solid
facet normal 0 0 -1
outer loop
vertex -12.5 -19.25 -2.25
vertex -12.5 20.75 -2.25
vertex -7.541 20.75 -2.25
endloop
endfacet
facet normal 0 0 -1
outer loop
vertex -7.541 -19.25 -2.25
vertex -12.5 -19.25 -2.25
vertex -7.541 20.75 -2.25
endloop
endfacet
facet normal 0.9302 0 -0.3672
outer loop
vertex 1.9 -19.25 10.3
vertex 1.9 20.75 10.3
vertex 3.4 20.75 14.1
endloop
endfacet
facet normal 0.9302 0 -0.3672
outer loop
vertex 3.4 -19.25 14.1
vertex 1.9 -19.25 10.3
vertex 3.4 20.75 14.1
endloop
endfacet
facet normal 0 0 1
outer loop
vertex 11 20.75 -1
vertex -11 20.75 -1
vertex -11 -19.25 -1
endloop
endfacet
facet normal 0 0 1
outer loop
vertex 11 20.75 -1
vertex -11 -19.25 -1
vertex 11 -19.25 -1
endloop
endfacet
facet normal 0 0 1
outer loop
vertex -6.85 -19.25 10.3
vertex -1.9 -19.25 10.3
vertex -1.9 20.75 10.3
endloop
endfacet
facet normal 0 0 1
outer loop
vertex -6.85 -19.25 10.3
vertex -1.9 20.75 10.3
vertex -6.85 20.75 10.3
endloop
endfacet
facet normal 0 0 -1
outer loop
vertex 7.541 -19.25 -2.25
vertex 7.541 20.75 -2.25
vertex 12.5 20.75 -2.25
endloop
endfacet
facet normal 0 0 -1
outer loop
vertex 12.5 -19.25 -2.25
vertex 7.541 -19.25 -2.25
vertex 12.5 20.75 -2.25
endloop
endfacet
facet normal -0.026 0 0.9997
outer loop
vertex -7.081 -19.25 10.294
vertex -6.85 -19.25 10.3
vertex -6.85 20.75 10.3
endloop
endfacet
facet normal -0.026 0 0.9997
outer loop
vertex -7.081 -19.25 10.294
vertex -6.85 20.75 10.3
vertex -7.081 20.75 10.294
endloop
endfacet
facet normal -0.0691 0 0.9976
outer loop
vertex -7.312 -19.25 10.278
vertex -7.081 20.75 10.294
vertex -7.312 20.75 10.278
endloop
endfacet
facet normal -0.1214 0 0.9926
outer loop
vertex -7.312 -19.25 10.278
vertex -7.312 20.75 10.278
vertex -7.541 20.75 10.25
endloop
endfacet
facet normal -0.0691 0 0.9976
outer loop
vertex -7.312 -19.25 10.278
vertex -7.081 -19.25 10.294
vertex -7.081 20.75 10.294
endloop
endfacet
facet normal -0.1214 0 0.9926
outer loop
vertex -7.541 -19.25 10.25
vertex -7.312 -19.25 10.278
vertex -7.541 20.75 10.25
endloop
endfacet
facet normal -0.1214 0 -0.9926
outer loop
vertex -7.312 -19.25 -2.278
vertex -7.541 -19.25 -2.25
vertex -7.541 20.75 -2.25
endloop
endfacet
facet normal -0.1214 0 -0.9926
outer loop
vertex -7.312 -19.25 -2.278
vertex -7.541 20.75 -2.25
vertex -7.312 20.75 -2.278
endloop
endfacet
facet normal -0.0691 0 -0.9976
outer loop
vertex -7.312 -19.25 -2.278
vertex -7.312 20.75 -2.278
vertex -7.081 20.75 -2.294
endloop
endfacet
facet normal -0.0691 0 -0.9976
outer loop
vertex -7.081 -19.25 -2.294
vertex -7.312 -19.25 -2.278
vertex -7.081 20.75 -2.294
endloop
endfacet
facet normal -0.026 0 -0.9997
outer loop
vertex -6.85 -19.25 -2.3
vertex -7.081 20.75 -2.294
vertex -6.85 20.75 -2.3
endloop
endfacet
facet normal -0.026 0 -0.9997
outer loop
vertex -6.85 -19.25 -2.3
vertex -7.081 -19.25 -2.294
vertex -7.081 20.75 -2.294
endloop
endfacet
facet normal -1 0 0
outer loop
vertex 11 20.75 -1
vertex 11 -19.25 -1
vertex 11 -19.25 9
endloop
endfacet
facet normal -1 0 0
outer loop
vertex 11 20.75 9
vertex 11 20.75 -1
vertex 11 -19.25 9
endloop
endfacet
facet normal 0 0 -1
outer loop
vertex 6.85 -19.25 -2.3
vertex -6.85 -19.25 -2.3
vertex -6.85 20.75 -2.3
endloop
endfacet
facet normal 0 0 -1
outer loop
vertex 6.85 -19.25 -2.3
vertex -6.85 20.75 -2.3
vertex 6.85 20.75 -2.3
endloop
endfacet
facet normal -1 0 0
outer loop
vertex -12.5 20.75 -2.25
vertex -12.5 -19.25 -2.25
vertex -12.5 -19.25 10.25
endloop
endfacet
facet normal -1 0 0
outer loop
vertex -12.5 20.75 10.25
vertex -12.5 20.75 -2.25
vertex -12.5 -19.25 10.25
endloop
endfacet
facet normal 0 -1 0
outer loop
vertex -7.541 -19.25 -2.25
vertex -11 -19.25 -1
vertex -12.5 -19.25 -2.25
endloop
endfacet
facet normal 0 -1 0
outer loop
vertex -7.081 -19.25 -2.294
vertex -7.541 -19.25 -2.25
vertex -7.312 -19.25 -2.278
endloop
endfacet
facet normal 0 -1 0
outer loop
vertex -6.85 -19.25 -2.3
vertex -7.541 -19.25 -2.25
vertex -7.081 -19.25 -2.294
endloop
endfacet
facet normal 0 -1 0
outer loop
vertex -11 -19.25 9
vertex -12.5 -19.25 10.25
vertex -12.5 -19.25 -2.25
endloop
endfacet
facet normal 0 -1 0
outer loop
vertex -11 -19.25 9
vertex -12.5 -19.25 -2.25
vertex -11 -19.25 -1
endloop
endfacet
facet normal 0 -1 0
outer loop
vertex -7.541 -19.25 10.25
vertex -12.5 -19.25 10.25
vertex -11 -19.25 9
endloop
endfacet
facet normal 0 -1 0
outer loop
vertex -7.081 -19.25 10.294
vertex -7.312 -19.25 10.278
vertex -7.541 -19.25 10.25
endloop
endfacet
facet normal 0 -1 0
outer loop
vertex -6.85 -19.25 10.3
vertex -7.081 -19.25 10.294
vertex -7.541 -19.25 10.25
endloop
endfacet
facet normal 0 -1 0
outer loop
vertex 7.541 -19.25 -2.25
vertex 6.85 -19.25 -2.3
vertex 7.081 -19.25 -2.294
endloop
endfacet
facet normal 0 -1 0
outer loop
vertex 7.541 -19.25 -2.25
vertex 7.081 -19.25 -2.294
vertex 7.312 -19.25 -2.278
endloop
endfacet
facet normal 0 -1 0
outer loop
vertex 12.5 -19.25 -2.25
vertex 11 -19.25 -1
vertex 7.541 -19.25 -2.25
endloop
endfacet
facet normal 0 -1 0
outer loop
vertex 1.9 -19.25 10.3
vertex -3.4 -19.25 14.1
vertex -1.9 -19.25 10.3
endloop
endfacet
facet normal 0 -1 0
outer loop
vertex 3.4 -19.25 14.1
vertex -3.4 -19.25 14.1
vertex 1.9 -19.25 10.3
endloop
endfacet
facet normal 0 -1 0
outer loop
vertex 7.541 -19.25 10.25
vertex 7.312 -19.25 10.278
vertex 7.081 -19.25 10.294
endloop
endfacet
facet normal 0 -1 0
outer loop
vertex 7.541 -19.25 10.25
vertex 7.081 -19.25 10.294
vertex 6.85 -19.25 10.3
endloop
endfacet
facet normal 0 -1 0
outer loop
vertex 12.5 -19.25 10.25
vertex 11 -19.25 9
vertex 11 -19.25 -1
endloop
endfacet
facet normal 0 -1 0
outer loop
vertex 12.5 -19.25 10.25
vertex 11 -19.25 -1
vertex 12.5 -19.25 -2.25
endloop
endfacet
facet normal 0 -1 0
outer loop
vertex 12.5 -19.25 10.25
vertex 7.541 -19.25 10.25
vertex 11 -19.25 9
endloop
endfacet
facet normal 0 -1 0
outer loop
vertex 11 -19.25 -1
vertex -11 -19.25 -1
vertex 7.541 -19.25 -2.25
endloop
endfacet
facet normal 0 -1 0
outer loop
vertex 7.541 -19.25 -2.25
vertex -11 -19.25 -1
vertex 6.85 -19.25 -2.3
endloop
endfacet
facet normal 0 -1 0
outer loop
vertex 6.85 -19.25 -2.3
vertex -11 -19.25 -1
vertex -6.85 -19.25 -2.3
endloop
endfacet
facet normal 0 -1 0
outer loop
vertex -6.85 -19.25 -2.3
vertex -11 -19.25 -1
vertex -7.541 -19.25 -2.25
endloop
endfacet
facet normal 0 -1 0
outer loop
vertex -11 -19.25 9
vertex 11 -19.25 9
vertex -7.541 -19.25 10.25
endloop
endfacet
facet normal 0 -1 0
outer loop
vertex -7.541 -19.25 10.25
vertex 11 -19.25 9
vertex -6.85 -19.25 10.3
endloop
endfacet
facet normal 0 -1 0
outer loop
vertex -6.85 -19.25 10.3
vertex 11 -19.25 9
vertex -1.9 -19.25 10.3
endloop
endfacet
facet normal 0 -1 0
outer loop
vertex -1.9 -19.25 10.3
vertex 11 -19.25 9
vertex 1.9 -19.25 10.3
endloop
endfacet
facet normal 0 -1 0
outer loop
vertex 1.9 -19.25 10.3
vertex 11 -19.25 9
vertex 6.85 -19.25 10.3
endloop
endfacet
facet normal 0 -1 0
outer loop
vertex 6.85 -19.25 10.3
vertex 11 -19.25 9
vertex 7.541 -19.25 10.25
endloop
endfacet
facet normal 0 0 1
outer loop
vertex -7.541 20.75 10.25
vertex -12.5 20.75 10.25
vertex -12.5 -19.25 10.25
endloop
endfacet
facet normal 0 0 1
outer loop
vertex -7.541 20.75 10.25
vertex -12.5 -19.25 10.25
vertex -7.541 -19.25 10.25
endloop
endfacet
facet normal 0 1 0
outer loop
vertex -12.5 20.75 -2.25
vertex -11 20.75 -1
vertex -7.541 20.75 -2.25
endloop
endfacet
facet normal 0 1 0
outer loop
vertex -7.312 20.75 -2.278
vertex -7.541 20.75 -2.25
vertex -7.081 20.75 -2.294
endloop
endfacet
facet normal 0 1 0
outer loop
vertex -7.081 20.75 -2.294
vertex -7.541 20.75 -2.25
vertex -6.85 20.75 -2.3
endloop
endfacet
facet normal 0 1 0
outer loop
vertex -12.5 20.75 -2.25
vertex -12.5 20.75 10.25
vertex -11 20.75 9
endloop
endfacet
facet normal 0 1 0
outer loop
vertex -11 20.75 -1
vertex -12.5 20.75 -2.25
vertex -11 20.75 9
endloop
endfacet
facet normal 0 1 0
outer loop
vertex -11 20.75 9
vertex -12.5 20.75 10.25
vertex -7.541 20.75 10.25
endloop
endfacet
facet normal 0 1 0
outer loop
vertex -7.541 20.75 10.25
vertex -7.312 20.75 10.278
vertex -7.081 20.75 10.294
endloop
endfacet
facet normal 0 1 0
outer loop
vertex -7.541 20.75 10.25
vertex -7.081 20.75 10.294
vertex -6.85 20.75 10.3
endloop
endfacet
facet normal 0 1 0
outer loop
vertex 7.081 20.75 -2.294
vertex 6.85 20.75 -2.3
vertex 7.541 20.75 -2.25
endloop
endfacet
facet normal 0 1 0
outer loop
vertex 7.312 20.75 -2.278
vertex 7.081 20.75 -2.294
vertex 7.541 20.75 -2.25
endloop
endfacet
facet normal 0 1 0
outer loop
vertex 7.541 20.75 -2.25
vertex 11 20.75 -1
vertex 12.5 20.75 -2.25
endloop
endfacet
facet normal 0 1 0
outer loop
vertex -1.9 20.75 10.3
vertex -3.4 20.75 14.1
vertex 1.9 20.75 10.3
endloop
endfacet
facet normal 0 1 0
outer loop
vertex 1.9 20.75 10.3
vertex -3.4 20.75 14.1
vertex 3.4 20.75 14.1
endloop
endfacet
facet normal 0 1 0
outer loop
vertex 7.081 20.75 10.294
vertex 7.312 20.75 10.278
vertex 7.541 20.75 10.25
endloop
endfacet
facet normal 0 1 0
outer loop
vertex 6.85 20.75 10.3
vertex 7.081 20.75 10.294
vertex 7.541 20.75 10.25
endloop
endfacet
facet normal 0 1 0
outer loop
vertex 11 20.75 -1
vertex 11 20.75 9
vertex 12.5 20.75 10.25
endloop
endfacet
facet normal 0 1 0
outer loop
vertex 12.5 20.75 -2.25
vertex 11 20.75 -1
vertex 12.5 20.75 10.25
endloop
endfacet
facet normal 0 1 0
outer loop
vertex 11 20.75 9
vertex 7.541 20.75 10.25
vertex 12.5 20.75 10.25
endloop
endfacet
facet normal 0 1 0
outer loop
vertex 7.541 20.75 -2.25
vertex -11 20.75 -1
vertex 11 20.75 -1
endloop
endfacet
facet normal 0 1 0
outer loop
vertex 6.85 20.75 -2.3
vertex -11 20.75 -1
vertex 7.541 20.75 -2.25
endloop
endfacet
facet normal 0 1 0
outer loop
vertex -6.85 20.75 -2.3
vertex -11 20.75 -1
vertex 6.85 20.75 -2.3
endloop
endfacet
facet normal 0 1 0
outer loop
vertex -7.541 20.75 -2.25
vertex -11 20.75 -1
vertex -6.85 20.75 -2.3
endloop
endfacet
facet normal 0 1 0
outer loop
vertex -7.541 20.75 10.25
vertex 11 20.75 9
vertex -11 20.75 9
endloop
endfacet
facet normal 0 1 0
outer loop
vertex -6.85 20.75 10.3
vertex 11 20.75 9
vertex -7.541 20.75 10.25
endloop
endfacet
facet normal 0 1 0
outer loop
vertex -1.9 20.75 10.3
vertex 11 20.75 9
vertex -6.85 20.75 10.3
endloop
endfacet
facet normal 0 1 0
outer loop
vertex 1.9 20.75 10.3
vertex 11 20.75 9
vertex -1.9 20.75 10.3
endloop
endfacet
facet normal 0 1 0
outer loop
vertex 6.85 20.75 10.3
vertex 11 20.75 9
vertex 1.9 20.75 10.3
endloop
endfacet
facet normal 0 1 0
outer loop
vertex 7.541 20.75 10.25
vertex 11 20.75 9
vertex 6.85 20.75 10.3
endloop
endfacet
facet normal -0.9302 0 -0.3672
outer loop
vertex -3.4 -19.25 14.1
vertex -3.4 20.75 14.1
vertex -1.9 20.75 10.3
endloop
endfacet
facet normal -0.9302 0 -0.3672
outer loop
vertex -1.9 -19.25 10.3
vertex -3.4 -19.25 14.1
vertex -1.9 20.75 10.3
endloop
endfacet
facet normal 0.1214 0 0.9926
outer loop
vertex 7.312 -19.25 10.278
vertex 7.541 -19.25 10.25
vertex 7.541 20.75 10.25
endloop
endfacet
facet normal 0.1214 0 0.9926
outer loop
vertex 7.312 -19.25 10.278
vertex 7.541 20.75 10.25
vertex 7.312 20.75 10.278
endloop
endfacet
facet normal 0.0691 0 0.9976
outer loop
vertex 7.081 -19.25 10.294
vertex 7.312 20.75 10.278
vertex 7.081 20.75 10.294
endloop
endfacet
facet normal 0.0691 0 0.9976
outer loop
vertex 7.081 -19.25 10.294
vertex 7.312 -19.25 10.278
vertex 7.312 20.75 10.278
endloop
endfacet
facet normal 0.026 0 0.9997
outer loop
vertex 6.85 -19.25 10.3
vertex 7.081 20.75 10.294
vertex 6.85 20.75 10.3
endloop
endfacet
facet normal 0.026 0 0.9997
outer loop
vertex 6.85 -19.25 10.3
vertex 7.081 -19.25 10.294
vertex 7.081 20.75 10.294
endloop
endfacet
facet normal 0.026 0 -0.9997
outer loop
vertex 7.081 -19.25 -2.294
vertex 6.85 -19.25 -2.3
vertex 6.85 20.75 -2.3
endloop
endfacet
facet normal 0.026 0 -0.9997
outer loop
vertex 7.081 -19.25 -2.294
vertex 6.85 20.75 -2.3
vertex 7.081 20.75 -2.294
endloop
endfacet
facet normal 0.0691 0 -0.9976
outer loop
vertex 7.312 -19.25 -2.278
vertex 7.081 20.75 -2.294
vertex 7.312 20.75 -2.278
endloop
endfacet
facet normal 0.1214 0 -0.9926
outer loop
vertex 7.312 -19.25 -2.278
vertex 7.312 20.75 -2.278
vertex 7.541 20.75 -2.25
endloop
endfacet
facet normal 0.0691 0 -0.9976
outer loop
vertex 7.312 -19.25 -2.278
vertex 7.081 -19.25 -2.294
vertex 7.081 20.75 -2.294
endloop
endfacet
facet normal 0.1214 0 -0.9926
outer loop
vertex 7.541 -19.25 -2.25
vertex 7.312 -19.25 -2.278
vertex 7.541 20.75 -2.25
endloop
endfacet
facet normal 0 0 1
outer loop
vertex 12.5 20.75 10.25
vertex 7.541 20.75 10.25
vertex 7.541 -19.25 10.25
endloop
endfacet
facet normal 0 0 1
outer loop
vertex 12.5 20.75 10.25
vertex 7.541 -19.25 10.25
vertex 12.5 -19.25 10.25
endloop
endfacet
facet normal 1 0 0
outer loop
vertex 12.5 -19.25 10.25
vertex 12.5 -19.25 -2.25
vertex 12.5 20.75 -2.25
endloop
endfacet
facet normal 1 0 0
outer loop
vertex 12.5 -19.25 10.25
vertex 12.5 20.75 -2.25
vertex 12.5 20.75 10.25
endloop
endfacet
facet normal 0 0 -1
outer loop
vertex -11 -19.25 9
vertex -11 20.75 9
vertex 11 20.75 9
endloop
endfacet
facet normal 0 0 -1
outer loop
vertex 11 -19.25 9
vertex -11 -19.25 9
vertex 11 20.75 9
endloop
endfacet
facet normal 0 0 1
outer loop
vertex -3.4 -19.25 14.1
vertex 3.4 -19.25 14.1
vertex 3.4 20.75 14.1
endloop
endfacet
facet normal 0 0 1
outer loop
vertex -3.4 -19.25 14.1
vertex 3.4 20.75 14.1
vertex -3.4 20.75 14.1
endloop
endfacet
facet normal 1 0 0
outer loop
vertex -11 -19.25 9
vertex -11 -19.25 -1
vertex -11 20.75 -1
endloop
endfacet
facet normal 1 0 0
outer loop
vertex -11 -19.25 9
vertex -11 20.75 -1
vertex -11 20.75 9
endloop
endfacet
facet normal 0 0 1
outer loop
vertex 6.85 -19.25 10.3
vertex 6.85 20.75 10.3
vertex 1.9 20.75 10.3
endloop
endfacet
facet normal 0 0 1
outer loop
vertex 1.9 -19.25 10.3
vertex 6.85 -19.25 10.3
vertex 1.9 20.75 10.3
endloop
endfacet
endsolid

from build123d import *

# Parameters (mm, degrees)
F0_W      = 18.7
F0_H      = 38.5
F1_DEPTH  = 8
F2_R      = 2.5
F4_DEPTH  = 40
F7_DEPTH  = 40
F8_W      = 25
F8_H      = 12.5
F9_DEPTH  = 40
F10_W     = 22
F10_H     = 10
F11_DEPTH = 40


with BuildPart() as f1:
    # F0 (on Top) → F1 (new body)
    with BuildSketch(Plane.XY):
        Rectangle(F0_W, F0_H)
    extrude(amount=F1_DEPTH)

    # F2
    f2_edges = [f1.edges().sort_by_distance(p)[0] for p in [
        (9.35, 0, 8),
        (9.35, 0, 0),
        (-9.35, 0, 8),
        (-9.35, 0, 0),
    ]]
    fillet(f2_edges, radius=F2_R)


with BuildPart() as f4:
    # F3 (on face) → F4 (new body)
    with BuildSketch(Plane.XZ.offset(19.25)):
        with BuildLine():
            Line((-11.65, 5.5), (-11.65, 2.5))
            ThreePointArc((-11.65, 2.5), (-10.244113, -0.894113), (-6.85, -2.3))
            Line((-6.85, -2.3), (6.85, -2.3))
            ThreePointArc((6.85, -2.3), (10.244113, -0.894113), (11.65, 2.5))
            Line((11.65, 2.5), (11.65, 5.5))
            ThreePointArc((11.65, 5.5), (10.244113, 8.894113), (6.85, 10.3))
            Line((6.85, 10.3), (-6.85, 10.3))
            ThreePointArc((-6.85, 10.3), (-10.244113, 8.894113), (-11.65, 5.5))
        make_face()
        with BuildLine():
            Line((-6.85, 8.3), (6.85, 8.3))
            ThreePointArc((6.85, 8.3), (8.829899, 7.479899), (9.65, 5.5))
            Line((9.65, 5.5), (9.65, 2.5))
            ThreePointArc((9.65, 2.5), (8.829899, 0.520101), (6.85, -0.3))
            Line((6.85, -0.3), (-6.85, -0.3))
            ThreePointArc((-6.85, -0.3), (-8.829899, 0.520101), (-9.65, 2.5))
            Line((-9.65, 2.5), (-9.65, 5.5))
            ThreePointArc((-9.65, 5.5), (-8.829899, 7.479899), (-6.85, 8.3))
        make_face(mode=Mode.SUBTRACT)
    extrude(amount=-F4_DEPTH)

    # F6 (on face) → F7 (join)
    with BuildSketch(Plane.XZ.offset(19.25)):
        Polygon((3.4, 14.1), (1.9, 14.1), (-1.9, 14.1), (-3.4, 14.1), (-1.9, 10.3), (1.9, 10.3), align=None)
    extrude(amount=-F7_DEPTH)

    # F8 (on face) → F9 (join)
    with BuildSketch(Plane.XZ.offset(19.25)):
        with Locations((0, 4)):
            Rectangle(F8_W, F8_H)
    extrude(amount=-F9_DEPTH)

    # F10 (on face) → F11 (cut)
    with BuildSketch(Plane.XZ.offset(19.25)):
        with Locations((0, 4)):
            Rectangle(F10_W, F10_H)
    extrude(amount=-F11_DEPTH, mode=Mode.SUBTRACT)


solid = f4.part
